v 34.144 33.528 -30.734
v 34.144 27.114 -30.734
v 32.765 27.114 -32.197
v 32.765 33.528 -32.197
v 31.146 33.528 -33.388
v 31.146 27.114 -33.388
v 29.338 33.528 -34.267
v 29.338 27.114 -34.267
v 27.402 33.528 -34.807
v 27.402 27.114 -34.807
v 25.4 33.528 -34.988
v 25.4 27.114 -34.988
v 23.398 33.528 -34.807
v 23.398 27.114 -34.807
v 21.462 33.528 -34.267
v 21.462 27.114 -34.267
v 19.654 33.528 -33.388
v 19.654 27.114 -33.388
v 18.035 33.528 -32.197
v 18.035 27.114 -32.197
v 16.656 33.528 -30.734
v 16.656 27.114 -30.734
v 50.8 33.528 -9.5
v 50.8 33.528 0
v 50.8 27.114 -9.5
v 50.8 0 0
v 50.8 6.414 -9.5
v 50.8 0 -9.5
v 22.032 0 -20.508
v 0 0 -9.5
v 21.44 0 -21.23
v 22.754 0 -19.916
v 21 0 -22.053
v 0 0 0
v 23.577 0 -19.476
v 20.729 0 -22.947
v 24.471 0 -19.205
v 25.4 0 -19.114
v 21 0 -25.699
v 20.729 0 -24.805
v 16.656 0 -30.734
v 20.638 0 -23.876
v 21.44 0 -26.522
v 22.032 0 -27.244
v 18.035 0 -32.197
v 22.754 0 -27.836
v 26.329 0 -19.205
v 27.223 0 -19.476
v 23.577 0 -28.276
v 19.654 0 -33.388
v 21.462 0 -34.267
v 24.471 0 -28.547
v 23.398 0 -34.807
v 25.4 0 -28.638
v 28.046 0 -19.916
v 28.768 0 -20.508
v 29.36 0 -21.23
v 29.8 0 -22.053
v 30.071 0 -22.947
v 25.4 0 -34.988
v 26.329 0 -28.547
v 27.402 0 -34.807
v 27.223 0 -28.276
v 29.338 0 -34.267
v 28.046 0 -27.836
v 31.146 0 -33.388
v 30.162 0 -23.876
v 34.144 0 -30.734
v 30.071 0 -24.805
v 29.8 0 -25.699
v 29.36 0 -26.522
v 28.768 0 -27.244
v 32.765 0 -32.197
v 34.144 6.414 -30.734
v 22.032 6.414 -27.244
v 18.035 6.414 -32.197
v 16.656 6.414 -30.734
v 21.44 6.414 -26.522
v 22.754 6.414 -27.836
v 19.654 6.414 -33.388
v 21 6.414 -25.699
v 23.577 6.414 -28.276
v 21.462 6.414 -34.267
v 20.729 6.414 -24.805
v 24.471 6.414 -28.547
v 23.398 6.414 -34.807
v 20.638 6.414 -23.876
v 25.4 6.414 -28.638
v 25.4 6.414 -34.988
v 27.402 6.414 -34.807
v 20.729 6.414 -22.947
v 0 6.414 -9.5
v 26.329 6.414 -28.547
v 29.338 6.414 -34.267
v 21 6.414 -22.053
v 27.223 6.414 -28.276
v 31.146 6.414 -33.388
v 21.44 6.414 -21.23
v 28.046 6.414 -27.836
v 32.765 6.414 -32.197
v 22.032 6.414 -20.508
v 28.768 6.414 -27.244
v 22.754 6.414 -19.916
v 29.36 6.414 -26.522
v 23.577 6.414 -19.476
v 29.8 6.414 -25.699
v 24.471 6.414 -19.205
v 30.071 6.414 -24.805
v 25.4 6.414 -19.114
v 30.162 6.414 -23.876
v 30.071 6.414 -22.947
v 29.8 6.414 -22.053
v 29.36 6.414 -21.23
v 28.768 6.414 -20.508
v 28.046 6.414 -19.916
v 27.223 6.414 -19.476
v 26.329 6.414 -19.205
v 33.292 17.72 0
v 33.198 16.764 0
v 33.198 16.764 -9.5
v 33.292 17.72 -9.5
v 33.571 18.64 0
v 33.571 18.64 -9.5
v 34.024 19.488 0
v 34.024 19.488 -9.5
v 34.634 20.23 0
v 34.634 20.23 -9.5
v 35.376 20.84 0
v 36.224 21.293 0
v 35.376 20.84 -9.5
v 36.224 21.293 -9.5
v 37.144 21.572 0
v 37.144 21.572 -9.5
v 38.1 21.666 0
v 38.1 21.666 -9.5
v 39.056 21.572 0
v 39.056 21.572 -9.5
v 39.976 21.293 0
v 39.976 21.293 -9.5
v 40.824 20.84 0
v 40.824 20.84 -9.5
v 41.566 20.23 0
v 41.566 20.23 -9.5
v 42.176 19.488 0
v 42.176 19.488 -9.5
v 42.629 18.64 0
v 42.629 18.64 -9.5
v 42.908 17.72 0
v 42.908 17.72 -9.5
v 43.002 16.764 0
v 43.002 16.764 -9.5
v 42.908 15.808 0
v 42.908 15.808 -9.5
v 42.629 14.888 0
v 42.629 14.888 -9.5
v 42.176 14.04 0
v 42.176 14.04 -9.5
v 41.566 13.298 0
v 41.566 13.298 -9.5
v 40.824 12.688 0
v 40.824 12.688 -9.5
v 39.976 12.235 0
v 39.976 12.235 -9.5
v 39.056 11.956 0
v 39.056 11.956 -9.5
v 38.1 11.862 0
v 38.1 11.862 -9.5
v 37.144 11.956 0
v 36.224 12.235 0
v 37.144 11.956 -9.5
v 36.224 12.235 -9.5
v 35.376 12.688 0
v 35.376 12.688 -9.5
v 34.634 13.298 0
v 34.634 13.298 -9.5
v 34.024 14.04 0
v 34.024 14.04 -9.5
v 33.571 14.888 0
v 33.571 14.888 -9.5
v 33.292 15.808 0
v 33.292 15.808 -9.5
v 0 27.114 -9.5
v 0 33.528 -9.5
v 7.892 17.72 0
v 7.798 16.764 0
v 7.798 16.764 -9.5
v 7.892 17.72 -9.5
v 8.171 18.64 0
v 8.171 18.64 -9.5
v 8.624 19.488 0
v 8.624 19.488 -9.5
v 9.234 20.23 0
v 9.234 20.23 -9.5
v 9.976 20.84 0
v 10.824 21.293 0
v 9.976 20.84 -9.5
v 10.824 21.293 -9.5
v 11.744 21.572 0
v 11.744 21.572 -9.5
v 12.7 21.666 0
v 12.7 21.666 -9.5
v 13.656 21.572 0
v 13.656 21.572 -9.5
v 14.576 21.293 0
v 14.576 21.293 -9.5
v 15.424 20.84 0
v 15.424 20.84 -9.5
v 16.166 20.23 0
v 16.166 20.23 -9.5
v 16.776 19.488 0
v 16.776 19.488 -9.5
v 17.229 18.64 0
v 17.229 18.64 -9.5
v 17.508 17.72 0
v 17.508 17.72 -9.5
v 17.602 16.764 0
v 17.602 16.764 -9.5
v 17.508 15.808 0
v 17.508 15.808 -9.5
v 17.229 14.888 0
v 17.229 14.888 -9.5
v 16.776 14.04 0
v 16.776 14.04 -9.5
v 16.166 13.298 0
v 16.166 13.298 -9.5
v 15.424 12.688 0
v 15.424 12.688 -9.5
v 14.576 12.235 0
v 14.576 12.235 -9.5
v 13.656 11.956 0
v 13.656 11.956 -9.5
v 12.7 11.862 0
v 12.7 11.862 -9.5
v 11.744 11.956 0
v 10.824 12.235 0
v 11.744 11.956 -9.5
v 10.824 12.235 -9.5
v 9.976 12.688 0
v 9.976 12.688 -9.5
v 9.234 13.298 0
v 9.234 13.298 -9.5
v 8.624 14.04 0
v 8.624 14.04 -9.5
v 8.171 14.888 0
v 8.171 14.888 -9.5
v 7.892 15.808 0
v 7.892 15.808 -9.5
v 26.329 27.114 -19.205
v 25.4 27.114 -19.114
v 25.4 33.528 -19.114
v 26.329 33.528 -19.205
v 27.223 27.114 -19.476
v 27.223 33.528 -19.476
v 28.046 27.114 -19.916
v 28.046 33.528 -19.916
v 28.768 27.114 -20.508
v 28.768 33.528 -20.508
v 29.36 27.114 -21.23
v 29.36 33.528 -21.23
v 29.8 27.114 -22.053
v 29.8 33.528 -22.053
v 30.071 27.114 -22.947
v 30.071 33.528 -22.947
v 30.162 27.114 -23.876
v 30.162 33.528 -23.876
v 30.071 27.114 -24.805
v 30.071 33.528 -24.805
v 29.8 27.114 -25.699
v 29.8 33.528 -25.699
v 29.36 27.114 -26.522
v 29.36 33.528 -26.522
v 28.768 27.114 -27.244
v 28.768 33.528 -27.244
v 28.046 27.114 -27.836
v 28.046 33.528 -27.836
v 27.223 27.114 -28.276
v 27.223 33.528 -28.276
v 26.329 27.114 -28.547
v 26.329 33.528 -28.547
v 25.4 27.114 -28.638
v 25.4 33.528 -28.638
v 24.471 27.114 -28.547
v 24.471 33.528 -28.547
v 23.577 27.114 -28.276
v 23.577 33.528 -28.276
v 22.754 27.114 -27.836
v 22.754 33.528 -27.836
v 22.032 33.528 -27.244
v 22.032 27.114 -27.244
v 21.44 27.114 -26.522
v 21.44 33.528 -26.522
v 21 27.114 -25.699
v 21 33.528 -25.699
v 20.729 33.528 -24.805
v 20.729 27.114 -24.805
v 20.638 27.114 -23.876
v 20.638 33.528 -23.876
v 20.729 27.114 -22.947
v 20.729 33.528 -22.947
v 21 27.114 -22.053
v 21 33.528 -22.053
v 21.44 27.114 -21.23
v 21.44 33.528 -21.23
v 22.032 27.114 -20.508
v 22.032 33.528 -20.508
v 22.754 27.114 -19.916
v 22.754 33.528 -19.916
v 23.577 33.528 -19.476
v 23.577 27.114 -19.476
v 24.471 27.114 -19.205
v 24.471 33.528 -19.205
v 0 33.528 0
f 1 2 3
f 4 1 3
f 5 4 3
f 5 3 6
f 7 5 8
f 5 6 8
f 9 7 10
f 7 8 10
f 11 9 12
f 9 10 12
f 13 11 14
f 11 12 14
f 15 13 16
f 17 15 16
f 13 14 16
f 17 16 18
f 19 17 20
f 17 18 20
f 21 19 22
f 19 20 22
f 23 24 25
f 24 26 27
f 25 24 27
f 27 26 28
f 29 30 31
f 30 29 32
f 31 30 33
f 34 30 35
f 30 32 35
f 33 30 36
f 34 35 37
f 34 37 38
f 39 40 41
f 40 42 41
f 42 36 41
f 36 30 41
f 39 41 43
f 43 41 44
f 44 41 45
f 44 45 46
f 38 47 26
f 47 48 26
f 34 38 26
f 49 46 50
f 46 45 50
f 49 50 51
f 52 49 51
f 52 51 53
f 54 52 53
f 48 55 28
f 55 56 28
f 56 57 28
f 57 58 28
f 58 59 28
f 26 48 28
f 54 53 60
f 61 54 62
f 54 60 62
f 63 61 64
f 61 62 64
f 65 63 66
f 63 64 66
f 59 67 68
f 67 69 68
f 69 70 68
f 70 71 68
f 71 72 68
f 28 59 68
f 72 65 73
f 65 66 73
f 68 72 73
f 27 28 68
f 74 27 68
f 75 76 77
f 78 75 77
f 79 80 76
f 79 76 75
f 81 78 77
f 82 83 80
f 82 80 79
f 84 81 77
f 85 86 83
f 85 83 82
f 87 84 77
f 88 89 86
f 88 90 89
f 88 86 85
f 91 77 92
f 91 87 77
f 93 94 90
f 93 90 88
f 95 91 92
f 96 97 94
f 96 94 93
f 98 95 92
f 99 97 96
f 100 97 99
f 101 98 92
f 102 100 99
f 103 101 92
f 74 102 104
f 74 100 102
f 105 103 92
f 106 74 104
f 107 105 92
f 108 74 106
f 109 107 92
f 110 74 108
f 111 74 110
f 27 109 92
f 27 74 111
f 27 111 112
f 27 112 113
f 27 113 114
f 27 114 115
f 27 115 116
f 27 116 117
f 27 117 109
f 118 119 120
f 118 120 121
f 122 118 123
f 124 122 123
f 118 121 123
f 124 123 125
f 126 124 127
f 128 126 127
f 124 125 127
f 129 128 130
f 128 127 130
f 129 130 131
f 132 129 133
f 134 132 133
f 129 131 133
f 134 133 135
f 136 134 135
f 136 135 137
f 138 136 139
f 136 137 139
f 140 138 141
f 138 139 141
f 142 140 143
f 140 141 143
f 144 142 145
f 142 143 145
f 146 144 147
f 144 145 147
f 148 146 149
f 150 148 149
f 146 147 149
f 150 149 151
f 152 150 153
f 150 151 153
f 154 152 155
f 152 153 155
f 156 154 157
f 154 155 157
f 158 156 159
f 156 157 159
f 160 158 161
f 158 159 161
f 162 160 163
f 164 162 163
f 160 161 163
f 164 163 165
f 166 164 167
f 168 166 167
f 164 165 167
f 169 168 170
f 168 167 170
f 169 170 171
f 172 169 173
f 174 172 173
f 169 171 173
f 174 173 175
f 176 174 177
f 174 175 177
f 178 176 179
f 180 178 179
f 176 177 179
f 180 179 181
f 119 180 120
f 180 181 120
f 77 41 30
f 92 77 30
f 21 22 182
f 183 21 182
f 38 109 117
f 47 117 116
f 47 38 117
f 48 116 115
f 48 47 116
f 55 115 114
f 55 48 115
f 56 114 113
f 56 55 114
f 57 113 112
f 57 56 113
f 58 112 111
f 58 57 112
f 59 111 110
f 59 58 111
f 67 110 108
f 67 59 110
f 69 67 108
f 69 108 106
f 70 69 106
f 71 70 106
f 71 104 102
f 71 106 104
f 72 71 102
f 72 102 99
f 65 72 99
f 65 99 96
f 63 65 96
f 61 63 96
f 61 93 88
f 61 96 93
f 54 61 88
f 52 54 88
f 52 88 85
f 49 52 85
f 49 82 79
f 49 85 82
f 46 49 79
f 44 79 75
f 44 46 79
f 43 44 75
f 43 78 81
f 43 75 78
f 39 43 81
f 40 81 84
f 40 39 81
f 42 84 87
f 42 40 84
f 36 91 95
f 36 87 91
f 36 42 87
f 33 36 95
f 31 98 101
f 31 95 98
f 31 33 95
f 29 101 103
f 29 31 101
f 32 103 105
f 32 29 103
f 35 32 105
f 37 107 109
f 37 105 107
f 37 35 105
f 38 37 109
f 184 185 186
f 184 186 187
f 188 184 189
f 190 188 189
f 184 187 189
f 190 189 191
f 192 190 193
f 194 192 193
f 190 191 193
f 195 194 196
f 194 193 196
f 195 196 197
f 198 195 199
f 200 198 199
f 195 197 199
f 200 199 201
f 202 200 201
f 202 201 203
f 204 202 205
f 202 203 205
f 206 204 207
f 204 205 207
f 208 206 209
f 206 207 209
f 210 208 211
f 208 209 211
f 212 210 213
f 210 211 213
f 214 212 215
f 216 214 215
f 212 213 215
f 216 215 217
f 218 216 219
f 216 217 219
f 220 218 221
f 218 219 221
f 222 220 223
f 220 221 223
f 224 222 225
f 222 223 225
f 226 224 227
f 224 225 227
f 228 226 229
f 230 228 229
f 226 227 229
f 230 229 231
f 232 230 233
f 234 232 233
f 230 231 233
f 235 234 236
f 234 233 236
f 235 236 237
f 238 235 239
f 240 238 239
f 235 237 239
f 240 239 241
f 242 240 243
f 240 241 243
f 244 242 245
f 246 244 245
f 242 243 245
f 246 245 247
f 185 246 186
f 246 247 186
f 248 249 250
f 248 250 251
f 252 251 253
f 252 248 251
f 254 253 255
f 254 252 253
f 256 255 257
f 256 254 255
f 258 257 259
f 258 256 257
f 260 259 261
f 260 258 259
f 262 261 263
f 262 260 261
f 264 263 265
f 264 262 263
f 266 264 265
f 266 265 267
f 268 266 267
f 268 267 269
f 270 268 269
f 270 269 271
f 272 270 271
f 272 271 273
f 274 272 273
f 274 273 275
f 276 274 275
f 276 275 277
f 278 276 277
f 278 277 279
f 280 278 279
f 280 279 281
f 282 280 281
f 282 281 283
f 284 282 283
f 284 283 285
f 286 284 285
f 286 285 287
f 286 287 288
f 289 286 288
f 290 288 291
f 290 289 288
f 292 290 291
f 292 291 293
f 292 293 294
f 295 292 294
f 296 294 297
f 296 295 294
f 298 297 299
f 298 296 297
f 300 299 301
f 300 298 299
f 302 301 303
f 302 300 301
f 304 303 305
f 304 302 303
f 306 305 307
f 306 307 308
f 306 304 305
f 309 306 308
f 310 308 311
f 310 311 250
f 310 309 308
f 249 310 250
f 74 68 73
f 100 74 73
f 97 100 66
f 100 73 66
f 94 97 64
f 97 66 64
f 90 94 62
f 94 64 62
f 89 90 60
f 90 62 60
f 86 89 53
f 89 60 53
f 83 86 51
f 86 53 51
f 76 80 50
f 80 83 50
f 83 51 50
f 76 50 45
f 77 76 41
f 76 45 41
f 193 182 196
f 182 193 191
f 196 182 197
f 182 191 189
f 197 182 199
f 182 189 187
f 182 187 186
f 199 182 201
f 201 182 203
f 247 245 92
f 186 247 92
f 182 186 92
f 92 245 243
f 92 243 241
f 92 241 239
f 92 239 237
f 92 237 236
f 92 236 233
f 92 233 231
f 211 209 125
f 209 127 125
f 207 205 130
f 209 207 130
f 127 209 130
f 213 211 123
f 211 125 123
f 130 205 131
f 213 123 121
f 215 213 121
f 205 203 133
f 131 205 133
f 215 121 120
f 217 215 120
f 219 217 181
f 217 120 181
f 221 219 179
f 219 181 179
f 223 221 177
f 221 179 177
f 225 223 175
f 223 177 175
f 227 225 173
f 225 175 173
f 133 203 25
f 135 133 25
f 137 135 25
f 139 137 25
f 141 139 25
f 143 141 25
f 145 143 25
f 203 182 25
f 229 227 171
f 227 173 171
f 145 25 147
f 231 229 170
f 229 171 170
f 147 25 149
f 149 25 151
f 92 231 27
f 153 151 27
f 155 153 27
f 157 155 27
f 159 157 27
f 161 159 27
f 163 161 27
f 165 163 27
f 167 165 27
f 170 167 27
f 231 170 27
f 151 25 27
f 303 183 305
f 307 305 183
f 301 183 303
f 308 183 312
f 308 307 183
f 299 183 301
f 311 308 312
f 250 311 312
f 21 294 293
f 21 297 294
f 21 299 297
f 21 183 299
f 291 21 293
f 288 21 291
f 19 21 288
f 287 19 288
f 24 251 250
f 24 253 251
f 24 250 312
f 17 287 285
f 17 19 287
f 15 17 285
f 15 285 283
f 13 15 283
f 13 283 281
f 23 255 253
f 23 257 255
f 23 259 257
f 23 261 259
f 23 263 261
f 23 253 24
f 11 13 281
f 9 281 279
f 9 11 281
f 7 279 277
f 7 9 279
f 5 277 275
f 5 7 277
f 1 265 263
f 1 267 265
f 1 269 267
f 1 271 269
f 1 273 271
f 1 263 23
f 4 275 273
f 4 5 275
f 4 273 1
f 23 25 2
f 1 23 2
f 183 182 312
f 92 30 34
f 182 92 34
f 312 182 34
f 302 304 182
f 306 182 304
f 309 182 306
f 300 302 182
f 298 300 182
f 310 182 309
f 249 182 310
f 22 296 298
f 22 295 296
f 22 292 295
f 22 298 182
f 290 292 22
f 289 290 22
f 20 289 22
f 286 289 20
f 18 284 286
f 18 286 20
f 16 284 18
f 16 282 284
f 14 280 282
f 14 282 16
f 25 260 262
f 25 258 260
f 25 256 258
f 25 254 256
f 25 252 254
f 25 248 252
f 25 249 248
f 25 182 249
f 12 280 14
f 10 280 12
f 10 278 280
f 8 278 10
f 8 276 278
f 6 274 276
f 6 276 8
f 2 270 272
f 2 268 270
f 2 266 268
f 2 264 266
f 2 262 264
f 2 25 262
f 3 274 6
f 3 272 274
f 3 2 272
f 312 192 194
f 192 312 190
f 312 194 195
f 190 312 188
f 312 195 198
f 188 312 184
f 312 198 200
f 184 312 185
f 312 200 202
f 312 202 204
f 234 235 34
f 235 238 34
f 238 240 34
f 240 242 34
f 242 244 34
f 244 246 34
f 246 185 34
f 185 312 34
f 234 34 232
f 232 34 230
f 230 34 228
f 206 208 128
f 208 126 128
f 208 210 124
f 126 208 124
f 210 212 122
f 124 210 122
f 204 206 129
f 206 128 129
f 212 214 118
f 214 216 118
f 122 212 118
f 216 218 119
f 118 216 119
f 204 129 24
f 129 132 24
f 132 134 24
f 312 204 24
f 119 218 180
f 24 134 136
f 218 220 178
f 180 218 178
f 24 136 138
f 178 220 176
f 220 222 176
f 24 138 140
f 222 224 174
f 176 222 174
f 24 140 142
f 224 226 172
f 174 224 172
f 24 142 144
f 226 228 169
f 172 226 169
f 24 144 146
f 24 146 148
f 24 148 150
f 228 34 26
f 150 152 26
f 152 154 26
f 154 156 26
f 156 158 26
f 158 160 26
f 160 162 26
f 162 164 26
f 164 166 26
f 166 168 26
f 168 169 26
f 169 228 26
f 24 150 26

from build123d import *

# Parameters (mm, degrees)
SKETCH1_R           = 4.7625
BOSS_EXTRUDE1_DEPTH = 33.528
CUT_EXTRUDE1_DEPTH  = 71.206566048
SKETCH3_R           = 4.9022
CUT_EXTRUDE2_DEPTH  = 9.4996


with BuildPart() as part:
    # Sketch1 → Boss-Extrude1 (new body)
    with BuildSketch(Plane(origin=(0, 0, 0), x_dir=(1, 0, 0), z_dir=(0, 1, 0))):
        with BuildLine():
            Line((0, 0), (50.8, 0))
            Line((50.8, 0), (50.8, 9.4996))
            Line((50.8, 9.4996), (34.143571574, 30.734397216))
            ThreePointArc((34.143571574, 30.734397216), (25.4, 34.9885), (16.656428426, 30.734397216))
            Line((16.656428426, 30.734397216), (0, 9.4996))
            Line((0, 9.4996), (0, 0))
        make_face()
        with Locations(Location((25.4, 23.876, 0), (0, 0, 270))):
            Circle(SKETCH1_R, mode=Mode.SUBTRACT)
    extrude(amount=BOSS_EXTRUDE1_DEPTH)

    # Sketch2 → Cut-Extrude1 (cut, through all)
    with BuildSketch(Plane(origin=(50.8, 0, 0), x_dir=(0, 0, -1), z_dir=(1, 0, 0))):
        Polygon((9.4996, 16.764), (9.4996, 27.1145), (34.9885, 27.1145), (34.9885, 6.4135), (9.4996, 6.4135), align=None)
    extrude(amount=-CUT_EXTRUDE1_DEPTH, mode=Mode.SUBTRACT)

    # Sketch3 → Cut-Extrude2 (cut)
    with BuildSketch(Plane(origin=(0, 0, -9.4996), x_dir=(-1, 0, 0), z_dir=(0, 0, -1))):
        with Locations((-38.1, 16.764)):
            Circle(SKETCH3_R)
        with Locations((-12.7, 16.764)):
            Circle(SKETCH3_R)
    extrude(amount=-CUT_EXTRUDE2_DEPTH, mode=Mode.SUBTRACT)


solid = part.part
